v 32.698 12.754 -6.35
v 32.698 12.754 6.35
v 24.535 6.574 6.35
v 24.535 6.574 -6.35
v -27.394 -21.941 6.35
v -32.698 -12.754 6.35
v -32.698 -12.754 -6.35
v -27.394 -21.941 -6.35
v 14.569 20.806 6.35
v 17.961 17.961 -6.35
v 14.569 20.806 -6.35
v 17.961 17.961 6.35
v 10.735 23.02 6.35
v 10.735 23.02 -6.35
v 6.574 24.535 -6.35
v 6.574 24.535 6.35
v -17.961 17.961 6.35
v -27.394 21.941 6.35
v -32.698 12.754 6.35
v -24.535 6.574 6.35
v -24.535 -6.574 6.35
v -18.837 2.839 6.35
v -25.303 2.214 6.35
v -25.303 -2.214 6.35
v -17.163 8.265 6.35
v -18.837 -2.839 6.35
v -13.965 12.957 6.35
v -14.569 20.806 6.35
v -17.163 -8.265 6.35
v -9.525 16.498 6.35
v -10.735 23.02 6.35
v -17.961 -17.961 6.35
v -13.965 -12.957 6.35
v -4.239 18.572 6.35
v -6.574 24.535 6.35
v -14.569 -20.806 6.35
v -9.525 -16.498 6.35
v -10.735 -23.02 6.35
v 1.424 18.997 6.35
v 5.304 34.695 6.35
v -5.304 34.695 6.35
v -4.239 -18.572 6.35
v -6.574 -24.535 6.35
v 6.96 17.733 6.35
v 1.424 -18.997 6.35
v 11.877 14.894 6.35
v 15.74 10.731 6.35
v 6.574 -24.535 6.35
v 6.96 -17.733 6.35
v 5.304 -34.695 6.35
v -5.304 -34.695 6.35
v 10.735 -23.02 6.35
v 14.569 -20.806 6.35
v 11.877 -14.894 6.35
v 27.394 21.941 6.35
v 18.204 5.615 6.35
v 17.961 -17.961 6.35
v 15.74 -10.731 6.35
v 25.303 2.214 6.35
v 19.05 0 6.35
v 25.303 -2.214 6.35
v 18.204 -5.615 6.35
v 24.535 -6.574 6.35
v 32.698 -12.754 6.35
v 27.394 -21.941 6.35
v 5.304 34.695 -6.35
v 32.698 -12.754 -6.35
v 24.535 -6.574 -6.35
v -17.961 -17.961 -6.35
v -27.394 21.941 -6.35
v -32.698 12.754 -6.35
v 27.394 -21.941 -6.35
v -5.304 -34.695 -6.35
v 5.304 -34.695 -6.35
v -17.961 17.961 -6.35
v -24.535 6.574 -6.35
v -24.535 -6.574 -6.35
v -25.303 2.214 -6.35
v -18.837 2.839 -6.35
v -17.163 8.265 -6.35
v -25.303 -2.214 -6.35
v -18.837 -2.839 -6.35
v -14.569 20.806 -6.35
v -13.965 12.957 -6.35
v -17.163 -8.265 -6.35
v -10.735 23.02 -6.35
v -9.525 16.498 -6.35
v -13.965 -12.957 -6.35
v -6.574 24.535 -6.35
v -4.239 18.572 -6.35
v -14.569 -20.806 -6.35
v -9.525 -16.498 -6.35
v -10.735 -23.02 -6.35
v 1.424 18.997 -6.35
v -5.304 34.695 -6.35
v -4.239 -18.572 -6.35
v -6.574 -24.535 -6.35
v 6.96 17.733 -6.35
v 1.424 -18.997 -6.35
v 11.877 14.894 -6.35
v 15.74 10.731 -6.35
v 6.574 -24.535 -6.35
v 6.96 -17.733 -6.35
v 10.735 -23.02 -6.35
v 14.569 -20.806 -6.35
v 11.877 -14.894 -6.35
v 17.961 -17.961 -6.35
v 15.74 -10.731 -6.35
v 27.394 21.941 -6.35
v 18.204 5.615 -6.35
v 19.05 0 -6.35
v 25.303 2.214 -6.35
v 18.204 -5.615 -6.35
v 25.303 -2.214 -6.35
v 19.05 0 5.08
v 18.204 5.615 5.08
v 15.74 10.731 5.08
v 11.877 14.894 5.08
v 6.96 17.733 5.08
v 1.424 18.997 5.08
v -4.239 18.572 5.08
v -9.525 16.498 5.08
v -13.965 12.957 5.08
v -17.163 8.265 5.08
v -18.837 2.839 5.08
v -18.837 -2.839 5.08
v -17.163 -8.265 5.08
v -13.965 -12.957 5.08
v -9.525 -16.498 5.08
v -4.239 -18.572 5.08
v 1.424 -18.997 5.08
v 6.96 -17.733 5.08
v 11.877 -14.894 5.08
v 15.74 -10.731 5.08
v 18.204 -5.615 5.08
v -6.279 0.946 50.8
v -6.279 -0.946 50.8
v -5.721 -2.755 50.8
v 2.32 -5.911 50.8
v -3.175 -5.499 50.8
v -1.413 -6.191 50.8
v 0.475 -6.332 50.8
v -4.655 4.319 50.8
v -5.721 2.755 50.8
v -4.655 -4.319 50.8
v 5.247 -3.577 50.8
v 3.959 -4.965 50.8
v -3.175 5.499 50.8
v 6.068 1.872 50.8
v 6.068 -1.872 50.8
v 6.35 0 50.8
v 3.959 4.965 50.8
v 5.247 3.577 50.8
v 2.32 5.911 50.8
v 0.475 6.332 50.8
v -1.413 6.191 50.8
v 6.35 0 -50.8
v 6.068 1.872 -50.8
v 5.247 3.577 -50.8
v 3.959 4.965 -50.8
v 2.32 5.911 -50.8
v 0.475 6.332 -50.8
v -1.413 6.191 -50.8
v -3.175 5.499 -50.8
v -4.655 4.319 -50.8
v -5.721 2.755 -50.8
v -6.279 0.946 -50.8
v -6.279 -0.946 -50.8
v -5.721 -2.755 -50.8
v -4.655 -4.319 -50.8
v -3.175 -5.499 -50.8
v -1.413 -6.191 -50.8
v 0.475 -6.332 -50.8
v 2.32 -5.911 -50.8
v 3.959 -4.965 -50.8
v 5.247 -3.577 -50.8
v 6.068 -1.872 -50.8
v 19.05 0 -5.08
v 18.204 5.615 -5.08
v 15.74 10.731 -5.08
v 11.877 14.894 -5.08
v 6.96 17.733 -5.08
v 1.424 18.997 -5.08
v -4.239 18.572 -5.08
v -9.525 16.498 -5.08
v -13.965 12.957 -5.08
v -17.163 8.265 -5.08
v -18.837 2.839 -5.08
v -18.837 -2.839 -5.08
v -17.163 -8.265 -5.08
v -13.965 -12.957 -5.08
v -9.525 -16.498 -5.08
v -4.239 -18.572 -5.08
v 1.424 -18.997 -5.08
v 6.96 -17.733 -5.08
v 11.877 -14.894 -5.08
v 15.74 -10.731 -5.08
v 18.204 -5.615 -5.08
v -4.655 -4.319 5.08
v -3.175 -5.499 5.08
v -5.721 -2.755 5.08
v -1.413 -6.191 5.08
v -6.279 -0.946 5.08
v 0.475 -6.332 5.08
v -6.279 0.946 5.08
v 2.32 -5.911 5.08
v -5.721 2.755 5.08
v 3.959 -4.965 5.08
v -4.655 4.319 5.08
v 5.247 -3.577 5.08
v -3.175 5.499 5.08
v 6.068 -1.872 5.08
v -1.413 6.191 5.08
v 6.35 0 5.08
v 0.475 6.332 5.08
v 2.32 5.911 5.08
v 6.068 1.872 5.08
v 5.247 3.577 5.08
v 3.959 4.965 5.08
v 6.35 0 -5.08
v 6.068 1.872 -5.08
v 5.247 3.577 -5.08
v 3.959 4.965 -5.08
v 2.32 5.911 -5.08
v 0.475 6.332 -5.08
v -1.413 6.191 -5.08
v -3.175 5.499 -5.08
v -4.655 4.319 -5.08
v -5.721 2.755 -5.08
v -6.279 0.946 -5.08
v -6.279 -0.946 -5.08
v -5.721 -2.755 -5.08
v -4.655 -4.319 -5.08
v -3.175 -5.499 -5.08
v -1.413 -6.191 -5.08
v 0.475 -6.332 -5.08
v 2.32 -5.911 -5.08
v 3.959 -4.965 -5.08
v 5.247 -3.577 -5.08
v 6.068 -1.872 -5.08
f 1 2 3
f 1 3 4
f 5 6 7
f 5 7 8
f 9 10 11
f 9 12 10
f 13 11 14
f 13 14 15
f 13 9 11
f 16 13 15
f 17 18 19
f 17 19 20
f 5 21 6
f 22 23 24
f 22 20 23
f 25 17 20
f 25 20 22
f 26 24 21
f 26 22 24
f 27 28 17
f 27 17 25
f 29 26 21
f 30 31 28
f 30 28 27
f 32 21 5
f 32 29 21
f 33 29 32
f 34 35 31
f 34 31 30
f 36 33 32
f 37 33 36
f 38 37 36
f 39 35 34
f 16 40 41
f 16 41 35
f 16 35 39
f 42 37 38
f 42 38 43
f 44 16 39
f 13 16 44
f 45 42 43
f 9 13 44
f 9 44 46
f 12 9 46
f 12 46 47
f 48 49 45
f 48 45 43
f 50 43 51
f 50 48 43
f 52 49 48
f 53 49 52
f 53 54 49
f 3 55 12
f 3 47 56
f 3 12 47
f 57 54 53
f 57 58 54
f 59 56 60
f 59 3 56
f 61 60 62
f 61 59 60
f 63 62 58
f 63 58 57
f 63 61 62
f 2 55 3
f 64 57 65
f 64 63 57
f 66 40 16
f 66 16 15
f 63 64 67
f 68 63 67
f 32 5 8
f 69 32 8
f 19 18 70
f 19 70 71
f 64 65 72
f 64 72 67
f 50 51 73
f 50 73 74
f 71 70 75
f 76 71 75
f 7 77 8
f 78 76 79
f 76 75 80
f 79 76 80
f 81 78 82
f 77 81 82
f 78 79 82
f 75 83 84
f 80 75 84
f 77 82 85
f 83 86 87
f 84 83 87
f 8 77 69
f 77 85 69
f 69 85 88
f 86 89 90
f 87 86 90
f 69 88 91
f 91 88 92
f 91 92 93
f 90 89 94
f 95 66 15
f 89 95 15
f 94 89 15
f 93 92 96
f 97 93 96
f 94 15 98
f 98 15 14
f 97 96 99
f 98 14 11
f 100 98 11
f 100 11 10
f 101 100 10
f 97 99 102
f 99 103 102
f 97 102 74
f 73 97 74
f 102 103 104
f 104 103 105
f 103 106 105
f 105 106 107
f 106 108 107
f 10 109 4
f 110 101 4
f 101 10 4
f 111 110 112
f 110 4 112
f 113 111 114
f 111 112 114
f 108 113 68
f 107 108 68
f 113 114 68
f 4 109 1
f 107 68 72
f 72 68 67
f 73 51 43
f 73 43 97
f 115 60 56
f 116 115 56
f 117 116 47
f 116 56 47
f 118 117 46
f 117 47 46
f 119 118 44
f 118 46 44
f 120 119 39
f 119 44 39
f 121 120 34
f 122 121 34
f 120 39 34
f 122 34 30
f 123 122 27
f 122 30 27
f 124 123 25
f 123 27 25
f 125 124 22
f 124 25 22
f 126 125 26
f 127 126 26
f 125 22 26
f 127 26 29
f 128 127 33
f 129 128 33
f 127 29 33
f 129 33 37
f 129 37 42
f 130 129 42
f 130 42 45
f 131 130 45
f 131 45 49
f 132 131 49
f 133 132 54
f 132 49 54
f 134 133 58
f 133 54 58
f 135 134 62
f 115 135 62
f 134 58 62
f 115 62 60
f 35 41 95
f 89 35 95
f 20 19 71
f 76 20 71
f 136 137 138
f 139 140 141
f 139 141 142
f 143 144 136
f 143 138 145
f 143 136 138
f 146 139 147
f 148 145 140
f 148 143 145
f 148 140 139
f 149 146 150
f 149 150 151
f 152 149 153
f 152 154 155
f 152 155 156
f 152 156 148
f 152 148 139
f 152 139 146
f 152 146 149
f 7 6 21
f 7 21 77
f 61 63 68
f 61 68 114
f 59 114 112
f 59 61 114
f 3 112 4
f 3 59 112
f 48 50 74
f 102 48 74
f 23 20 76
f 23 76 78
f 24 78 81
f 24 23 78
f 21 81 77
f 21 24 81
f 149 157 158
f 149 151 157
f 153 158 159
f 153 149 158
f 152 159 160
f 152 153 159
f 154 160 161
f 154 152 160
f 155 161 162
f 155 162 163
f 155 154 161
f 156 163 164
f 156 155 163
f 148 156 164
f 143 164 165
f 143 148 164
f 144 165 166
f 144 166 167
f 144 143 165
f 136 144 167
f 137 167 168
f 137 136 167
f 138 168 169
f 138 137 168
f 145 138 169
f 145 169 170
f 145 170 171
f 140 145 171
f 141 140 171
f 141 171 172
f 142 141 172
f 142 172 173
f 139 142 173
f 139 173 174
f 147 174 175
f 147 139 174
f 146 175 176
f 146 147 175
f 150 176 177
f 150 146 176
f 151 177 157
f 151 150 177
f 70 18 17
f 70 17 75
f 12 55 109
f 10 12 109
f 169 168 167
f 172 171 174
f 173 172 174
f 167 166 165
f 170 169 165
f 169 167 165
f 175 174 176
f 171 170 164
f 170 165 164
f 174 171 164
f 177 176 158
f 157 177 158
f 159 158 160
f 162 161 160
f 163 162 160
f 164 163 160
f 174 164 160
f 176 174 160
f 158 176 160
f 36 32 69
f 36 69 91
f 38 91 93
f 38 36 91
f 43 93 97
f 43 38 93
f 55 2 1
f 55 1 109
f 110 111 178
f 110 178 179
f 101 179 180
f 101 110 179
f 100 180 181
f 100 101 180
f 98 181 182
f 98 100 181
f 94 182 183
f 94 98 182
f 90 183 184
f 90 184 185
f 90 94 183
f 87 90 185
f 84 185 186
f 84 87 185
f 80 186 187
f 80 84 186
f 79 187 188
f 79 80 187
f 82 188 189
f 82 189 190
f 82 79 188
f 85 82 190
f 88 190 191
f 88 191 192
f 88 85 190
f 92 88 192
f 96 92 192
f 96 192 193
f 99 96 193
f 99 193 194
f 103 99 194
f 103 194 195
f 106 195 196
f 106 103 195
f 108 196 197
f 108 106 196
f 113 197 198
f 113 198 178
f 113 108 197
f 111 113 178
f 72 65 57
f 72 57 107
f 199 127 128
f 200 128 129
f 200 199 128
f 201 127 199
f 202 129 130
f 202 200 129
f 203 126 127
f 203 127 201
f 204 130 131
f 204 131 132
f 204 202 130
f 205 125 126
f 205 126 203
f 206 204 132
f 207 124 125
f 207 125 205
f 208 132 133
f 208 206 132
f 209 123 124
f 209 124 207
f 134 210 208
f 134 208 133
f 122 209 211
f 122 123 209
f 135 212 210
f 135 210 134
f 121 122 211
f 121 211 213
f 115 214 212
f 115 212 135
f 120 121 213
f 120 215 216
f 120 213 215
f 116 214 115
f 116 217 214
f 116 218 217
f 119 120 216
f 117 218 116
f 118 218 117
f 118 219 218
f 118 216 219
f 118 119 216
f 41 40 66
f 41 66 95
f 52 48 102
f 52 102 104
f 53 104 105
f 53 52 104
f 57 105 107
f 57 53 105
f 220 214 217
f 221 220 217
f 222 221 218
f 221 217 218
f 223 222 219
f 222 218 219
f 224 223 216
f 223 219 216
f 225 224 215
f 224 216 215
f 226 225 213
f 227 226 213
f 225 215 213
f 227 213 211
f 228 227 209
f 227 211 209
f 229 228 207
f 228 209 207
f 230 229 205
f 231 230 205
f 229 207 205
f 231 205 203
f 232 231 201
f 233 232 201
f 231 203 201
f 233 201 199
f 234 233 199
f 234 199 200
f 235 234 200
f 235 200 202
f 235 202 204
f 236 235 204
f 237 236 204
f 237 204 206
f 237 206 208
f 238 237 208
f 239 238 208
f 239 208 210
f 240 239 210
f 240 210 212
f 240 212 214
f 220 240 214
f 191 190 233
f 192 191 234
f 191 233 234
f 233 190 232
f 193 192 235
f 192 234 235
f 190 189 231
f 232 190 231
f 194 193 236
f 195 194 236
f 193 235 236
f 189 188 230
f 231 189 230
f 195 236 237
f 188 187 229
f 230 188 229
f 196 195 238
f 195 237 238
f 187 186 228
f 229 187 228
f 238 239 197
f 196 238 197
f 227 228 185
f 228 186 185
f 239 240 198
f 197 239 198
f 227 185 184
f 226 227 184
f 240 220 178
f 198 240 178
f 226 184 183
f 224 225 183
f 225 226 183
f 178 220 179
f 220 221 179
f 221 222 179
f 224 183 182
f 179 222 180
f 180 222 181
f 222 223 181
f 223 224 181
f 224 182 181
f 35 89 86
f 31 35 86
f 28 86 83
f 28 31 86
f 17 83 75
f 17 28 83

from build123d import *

# Parameters (mm, degrees)
F0_R       = 25.4
F1_DEPTH   = 6.35
F3_DEPTH   = 12.7
F4_SIZE2   = 1.26999
F4_SIZE    = 10.15999
F4_2_SIZE2 = 1.26999
F4_2_SIZE  = 10.15999
F6_COUNT   = 6
F7_R       = 19.05
F7_R_2     = 6.35
F8_DEPTH   = 1.27
F9_DEPTH   = 25.4
F10_R      = 6.35
F11_DEPTH  = 50.8


# Not quite as in the source:
# - a fillet or chamfer is up to 0.001 mm smaller than in the source, because OpenCascade refuses the exact size
# - a pattern or mirror of a feature is missing from the dataset's text; its kind, count and spacing are read off the source's solid


with BuildPart() as f1:
    # F0 (on Top) → F1 (new body, symmetric)
    with BuildSketch(Plane.XY):
        Circle(F0_R)
    extrude(amount=F1_DEPTH, both=True)

    # F2 (on face) → F3 (join)
    with BuildSketch(Plane.XY.offset(6.35)):
        with BuildLine():
            ThreePointArc((-6.5740037456, 24.5345159877), (0, 25.4), (6.5740037456, 24.5345159877))
            Line((6.5740037456, 24.5345159877), (6.5740037456, 34.6945159877))
            Line((6.5740037456, 34.6945159877), (-6.5740037456, 34.6945159877))
            Line((-6.5740037456, 34.6945159877), (-6.5740037456, 24.5345159877))
        make_face()
    extrude(amount=-F3_DEPTH)

    # F4 (size 10.16 and 1.27 in the source; OpenCascade refuses exactly that, so slightly less here)
    f4_edges = [f1.edges().sort_by_distance(p)[0] for p in [
        (6.574004, 34.694516, 0),
    ]]
    f4_side = f1.faces().sort_by_distance((6.574004, 29.614516, 0))[0]
    chamfer(f4_edges, length=F4_SIZE, length2=F4_SIZE2, reference=f4_side)

    # F4#2 (size 10.16 and 1.27 in the source; OpenCascade refuses exactly that, so slightly less here)
    f4_2_edges = [f1.edges().sort_by_distance(p)[0] for p in [
        (-6.574004, 34.694516, 0),
    ]]
    f4_2_side = f1.faces().sort_by_distance((-6.574004, 29.614516, 0))[0]
    chamfer(f4_2_edges, length=F4_2_SIZE, length2=F4_2_SIZE2, reference=f4_2_side)

    # F6: F1 ×6 about axis
    f6_axis = Axis((0, 0, 22.000901401), (0, 0, 1))


with BuildPart() as f1_1:
    add(f1.part)
    for i in range(1, F6_COUNT):
        add(f1.part.rotate(f6_axis, i * 360 / F6_COUNT))

    # F7 (on face) → F8 (cut)
    with BuildSketch(Plane.XY.offset(6.35)):
        Circle(F7_R)
        Circle(F7_R_2, mode=Mode.SUBTRACT)
        Circle(F7_R_2)
    f8 = extrude(amount=-F8_DEPTH, mode=Mode.SUBTRACT)

    # F8_copies: F8 across plane
    add(f8.mirror(Plane(origin=(0, 0, 0), x_dir=(-1, 0, 0), z_dir=(0, 0, -1))), mode=Mode.SUBTRACT)

    # F7 (on face) → F9 (cut)
    with BuildSketch(Plane.XY.offset(6.35)):
        Circle(F7_R_2)
    extrude(amount=-F9_DEPTH, mode=Mode.SUBTRACT)


with BuildPart() as f11:
    # F10 (on Top) → F11 (new body, symmetric)
    with BuildSketch(Plane.XY):
        Circle(F10_R)
    extrude(amount=F11_DEPTH, both=True)


solid = Compound([f1_1.part, f11.part])
